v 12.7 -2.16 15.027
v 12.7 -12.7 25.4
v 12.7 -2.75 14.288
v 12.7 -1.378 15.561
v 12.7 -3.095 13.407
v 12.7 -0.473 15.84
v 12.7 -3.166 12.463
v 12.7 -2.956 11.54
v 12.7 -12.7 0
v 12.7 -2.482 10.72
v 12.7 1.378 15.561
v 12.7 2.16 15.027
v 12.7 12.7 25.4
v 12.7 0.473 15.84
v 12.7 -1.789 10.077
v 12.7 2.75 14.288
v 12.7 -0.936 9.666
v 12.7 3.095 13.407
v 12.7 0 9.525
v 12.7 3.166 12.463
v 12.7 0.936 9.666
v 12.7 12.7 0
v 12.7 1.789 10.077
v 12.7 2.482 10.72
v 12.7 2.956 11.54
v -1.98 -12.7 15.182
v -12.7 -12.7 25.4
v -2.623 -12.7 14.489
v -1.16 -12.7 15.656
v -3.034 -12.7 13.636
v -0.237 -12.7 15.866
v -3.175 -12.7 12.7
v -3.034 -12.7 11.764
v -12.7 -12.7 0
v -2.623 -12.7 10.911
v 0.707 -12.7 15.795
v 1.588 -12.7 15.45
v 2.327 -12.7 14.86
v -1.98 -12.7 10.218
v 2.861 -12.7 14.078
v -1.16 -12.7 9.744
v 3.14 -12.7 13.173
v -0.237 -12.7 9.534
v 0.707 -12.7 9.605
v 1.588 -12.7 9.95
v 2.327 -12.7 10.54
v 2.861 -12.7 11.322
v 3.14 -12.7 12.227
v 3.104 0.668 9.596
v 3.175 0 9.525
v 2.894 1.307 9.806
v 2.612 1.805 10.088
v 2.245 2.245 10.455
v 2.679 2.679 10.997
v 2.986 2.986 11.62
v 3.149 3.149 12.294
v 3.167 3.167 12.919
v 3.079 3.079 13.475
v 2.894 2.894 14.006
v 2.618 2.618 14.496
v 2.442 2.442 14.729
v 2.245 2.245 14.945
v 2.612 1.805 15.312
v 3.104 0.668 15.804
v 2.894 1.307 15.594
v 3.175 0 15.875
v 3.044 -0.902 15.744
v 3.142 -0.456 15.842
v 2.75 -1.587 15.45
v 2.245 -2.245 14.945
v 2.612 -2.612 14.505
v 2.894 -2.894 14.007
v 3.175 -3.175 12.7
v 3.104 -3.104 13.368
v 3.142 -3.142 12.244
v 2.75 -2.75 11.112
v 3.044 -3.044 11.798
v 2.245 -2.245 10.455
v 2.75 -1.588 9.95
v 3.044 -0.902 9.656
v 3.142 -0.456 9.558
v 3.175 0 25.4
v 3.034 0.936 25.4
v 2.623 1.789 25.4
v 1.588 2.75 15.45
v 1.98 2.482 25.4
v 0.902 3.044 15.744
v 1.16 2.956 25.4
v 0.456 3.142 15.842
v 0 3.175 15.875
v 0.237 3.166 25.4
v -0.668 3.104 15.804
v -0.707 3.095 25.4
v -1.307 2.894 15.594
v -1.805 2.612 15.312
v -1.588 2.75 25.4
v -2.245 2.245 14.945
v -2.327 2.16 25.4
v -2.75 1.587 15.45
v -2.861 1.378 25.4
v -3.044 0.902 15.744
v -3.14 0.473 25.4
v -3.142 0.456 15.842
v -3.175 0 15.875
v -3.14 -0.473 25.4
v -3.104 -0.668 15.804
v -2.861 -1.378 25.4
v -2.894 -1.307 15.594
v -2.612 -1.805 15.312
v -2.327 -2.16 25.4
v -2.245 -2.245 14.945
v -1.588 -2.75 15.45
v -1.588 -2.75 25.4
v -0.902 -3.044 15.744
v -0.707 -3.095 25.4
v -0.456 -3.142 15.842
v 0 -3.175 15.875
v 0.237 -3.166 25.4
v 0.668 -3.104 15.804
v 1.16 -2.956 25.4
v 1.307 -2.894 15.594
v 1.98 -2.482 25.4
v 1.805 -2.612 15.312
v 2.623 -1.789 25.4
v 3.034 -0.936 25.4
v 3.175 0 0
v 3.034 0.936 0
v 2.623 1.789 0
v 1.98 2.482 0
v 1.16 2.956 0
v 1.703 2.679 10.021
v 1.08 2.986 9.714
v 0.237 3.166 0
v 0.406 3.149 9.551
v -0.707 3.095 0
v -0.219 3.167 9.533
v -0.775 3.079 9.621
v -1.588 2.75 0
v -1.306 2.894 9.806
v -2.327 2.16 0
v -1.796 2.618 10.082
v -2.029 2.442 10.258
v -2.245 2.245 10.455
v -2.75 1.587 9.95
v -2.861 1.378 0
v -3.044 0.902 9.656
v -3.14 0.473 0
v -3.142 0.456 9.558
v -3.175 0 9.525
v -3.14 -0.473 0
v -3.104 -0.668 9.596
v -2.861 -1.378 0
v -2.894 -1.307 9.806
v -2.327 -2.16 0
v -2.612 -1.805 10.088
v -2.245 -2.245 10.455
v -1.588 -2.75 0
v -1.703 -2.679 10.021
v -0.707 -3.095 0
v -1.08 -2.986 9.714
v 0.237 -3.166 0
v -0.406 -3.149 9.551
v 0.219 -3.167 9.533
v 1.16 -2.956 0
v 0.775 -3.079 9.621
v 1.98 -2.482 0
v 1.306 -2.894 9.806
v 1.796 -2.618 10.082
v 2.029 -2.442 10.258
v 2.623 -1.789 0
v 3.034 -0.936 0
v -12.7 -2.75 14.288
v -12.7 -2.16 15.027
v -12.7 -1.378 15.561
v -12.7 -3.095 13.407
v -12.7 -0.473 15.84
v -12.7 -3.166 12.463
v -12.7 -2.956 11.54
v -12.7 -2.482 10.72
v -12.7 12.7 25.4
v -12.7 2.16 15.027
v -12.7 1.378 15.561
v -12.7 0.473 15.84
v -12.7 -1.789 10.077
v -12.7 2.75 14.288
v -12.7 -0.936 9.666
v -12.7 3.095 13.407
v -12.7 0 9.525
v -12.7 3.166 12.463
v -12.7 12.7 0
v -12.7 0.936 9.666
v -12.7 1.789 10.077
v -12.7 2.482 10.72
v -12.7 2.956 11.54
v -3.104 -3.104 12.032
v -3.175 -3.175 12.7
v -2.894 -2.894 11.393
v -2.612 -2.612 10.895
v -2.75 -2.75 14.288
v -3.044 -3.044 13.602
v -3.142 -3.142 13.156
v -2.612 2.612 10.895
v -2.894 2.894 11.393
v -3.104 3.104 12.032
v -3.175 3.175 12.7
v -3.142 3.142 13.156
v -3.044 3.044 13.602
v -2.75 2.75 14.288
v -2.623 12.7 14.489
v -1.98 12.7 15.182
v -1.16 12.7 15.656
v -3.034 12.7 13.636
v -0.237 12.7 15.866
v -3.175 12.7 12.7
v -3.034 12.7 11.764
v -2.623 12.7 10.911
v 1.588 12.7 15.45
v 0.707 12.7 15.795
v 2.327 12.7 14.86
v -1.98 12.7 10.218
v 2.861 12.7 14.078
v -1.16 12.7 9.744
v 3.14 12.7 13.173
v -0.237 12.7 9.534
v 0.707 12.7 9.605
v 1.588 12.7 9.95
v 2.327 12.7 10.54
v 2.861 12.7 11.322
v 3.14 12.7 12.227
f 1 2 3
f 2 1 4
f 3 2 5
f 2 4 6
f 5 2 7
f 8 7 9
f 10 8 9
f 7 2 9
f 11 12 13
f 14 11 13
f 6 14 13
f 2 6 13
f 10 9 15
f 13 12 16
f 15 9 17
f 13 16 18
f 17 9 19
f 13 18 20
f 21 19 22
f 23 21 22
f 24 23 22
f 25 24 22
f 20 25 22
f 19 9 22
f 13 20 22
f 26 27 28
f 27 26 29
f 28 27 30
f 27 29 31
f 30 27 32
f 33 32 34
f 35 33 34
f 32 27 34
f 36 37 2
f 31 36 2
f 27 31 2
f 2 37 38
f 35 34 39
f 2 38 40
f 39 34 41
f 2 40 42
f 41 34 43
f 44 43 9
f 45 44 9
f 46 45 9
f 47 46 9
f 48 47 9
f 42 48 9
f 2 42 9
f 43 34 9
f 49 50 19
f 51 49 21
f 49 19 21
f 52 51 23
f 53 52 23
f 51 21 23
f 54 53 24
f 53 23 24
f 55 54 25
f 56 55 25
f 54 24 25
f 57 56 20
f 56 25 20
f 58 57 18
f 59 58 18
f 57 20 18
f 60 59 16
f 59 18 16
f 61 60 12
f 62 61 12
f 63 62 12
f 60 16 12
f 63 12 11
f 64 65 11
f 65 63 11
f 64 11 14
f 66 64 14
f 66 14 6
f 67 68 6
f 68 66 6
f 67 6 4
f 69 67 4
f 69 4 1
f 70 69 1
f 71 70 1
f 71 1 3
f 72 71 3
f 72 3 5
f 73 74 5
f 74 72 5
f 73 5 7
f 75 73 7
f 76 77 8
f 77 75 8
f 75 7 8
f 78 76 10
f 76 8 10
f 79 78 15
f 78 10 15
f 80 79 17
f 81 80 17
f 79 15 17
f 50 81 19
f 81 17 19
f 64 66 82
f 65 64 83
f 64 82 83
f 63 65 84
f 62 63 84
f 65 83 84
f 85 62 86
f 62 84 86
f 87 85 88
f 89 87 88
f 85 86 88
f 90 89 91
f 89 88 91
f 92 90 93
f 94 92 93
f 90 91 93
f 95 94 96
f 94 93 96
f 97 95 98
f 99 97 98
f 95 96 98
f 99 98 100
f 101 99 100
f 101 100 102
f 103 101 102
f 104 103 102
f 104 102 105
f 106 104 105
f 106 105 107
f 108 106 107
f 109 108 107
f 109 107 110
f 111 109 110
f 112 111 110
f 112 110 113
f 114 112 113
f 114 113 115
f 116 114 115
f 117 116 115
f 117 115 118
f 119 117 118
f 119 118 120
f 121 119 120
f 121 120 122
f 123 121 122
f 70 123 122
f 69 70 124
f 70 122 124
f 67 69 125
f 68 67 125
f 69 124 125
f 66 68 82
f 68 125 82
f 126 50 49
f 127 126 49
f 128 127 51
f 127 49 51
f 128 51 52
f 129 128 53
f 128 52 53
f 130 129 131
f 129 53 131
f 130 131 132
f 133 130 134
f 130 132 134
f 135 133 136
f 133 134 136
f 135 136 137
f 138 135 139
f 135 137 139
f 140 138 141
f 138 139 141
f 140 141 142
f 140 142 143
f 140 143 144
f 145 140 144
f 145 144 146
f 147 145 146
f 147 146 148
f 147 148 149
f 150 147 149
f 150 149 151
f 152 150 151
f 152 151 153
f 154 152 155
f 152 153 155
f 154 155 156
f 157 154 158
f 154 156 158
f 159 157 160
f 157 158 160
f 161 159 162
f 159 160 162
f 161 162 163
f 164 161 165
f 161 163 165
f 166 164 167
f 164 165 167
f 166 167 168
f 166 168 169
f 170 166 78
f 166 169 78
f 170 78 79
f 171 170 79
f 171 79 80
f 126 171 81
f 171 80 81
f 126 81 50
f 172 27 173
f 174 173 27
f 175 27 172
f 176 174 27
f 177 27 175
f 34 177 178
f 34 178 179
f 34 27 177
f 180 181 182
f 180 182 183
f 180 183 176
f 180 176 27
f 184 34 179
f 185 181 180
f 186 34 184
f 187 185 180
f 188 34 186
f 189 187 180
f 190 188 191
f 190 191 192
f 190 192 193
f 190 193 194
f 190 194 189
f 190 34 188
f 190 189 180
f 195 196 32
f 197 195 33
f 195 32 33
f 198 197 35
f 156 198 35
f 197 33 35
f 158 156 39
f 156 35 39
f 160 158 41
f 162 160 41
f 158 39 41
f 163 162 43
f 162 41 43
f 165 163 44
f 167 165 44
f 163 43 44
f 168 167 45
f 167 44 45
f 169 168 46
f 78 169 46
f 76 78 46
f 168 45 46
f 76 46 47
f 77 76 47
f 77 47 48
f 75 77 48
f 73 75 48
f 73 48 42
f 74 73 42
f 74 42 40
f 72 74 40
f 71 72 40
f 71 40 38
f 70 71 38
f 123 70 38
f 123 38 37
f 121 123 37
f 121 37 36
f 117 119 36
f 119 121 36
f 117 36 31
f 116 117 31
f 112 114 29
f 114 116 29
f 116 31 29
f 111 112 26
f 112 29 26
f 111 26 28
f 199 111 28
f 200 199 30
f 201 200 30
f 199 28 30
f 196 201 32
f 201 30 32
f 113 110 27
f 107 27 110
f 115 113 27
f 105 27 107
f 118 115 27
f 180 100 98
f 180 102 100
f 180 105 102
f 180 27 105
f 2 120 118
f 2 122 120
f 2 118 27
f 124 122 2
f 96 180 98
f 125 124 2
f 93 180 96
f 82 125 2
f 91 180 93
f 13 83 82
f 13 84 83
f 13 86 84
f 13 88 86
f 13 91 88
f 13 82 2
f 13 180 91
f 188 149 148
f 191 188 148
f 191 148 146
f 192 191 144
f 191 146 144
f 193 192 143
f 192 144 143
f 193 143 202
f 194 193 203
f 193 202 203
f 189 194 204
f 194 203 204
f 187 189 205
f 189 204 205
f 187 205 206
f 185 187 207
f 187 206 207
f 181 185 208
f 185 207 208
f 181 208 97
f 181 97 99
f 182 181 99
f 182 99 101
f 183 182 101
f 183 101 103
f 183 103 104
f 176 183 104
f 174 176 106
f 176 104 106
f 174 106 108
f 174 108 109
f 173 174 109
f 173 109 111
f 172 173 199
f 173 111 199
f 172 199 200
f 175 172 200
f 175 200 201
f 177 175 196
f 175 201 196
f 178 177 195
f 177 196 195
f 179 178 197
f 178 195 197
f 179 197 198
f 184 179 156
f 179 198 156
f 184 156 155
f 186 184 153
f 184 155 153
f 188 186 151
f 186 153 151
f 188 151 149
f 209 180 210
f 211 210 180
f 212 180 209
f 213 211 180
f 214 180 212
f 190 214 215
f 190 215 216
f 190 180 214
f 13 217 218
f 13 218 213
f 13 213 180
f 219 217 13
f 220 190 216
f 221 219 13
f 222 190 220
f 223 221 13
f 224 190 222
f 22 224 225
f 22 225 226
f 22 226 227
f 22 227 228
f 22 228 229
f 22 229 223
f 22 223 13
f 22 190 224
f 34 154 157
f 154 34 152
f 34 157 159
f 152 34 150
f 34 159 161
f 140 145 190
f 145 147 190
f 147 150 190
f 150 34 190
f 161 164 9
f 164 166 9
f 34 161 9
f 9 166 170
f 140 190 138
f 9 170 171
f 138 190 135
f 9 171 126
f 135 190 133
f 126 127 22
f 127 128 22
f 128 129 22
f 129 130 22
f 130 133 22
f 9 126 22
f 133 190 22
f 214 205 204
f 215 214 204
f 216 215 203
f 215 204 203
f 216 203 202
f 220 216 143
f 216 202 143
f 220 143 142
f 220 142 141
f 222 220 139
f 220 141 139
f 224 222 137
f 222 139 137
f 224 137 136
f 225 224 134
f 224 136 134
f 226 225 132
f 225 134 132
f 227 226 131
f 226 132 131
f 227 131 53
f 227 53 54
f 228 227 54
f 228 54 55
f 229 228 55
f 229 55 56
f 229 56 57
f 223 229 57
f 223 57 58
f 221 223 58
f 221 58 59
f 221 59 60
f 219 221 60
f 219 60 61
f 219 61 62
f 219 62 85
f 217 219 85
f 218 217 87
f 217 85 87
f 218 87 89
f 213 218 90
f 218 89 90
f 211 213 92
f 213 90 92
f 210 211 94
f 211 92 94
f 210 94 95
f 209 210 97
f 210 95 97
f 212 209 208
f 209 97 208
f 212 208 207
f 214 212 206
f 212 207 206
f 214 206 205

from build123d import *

# Parameters (mm, degrees)
SKETCH1_W                   = 25.4
SKETCH1_H                   = 25.4
BOSS_EXTRUDE1_DEPTH         = 25.4
F_1_4_0_25_DIAMETER_HOLE1_D = 6.35
F_1_4_0_25_DIAMETER_HOLE2_D = 6.35
F_1_4_0_25_DIAMETER_HOLE3_D = 6.35


with BuildPart() as part:
    # Sketch1 → Boss-Extrude1 (new body)
    with BuildSketch(Plane.XY):
        Rectangle(SKETCH1_W, SKETCH1_H)
    extrude(amount=BOSS_EXTRUDE1_DEPTH)

    # 1/4 (0.25) Diameter Hole1 (through all)
    with Locations(Plane(origin=(0, 0, 0), x_dir=(-1, 0, 0), z_dir=(0, 0, -1))):
        with Locations((0, 0)):
            Hole(F_1_4_0_25_DIAMETER_HOLE1_D / 2)

    # 1/4 (0.25) Diameter Hole2 (through all)
    with Locations(Plane(origin=(0, 12.7, 0), x_dir=(1, 0, 0), z_dir=(0, 1, 0))):
        with Locations((0, -12.7)):
            Hole(F_1_4_0_25_DIAMETER_HOLE2_D / 2)

    # 1/4 (0.25) Diameter Hole3 (through all)
    with Locations(Plane.ZY.offset(12.7)):
        with Locations((12.7, 0)):
            Hole(F_1_4_0_25_DIAMETER_HOLE3_D / 2)


solid = part.part
